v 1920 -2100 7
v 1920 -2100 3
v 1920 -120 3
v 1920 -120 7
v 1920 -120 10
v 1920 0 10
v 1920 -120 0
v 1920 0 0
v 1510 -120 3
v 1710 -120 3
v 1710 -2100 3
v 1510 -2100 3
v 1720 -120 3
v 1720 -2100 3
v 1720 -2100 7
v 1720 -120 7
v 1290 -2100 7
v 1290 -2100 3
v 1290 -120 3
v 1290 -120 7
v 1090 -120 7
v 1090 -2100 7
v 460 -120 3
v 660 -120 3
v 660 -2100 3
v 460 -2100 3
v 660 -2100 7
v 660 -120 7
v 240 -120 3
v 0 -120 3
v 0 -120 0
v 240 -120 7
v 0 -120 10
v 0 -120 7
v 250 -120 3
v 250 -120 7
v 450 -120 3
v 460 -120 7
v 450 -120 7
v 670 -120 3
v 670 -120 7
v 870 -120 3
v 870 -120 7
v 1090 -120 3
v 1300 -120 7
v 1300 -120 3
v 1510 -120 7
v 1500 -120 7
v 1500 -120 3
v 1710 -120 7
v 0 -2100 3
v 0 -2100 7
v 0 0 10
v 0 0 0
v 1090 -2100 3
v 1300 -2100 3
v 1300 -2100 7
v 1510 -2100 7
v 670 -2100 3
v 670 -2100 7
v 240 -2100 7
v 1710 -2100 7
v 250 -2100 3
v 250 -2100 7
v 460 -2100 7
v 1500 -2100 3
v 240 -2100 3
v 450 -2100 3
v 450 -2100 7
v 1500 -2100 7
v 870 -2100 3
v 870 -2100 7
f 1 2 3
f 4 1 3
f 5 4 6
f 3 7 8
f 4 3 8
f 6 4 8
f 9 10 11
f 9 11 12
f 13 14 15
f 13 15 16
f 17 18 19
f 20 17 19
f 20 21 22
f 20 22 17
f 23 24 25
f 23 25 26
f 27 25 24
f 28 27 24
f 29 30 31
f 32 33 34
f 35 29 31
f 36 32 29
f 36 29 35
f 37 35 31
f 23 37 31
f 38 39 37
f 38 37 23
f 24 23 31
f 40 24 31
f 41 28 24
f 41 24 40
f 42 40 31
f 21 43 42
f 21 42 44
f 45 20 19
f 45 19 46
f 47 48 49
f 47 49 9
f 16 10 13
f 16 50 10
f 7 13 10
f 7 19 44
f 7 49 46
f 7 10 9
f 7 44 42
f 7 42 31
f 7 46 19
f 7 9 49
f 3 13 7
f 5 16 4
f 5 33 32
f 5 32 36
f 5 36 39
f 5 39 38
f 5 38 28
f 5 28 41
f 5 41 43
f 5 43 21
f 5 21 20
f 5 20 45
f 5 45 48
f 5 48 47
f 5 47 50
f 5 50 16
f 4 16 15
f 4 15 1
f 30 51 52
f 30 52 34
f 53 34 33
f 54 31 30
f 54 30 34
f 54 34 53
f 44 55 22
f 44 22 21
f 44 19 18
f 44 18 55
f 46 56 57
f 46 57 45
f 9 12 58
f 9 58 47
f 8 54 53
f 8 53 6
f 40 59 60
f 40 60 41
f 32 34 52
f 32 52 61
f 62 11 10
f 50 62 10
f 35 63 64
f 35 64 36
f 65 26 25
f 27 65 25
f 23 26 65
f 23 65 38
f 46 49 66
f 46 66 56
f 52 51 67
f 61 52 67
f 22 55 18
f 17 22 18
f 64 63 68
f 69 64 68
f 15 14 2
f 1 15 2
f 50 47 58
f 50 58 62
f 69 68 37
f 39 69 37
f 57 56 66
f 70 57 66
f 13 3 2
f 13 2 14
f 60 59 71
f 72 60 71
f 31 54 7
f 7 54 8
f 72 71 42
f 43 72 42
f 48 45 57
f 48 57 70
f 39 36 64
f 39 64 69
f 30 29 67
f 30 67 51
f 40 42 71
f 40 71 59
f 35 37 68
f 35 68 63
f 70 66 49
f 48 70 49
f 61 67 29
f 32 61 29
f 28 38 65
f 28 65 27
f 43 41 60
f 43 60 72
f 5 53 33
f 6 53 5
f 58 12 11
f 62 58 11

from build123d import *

# Parameters (mm, degrees)
CROQUIS1_W              = 1920
CROQUIS1_H              = 2100
SALIENTE_EXTRUIR1_DEPTH = 10
CROQUIS2_W              = 1920
CROQUIS2_H              = 1980
CORTAR_EXTRUIR1_DEPTH   = 3
CROQUIS3_W              = 1920
CROQUIS3_H              = 1980
CORTAR_EXTRUIR2_DEPTH   = 3
CROQUIS4_W              = 10
CROQUIS4_H              = 1980
CORTAR_EXTRUIR3_DEPTH   = 8
MATRIZL1_COUNT          = 8
MATRIZL1_PITCH          = 210
CROQUIS5_W              = 200
CROQUIS5_H              = 1980
CORTAR_EXTRUIR4_DEPTH   = 10


with BuildPart() as part:
    # Croquis1 → Saliente-Extruir1 (new body)
    with BuildSketch(Plane.XY):
        with Locations((960, -1050)):
            Rectangle(CROQUIS1_W, CROQUIS1_H)
    extrude(amount=SALIENTE_EXTRUIR1_DEPTH)

    # Croquis2 → Cortar-Extruir1 (cut)
    with BuildSketch(Plane.XY.offset(10)):
        with Locations((960, -1110)):
            Rectangle(CROQUIS2_W, CROQUIS2_H)
    extrude(amount=-CORTAR_EXTRUIR1_DEPTH, mode=Mode.SUBTRACT)

    # Croquis3 → Cortar-Extruir2 (cut)
    with BuildSketch(Plane(origin=(0, 0, 0), x_dir=(-1, 0, 0), z_dir=(0, 0, -1))):
        with Locations((-960, -1110)):
            Rectangle(CROQUIS3_W, CROQUIS3_H)
    extrude(amount=-CORTAR_EXTRUIR2_DEPTH, mode=Mode.SUBTRACT)

    # Croquis4 → Cortar-Extruir3 (cut)
    with BuildSketch(Plane(origin=(0, 0, 3), x_dir=(-1, 0, 0), z_dir=(0, 0, -1))):
        with Locations((-1715, -1110)):
            Rectangle(CROQUIS4_W, CROQUIS4_H)
    cortar_extruir3 = extrude(amount=-CORTAR_EXTRUIR3_DEPTH, mode=Mode.SUBTRACT)

    # MatrizL1: Cortar-Extruir3 ×8
    with Locations(*[(-i * MATRIZL1_PITCH, 0, 0) for i in range(1, MATRIZL1_COUNT)]):
        add(cortar_extruir3, mode=Mode.SUBTRACT)

    # Croquis5 → Cortar-Extruir4 (cut)
    with BuildSketch(Plane(origin=(0, 0, 3), x_dir=(-1, 0, 0), z_dir=(0, 0, -1))):
        with Locations((-980, -1110)):
            Rectangle(CROQUIS5_W, CROQUIS5_H)
    extrude(amount=-CORTAR_EXTRUIR4_DEPTH, mode=Mode.SUBTRACT)


solid = part.part
